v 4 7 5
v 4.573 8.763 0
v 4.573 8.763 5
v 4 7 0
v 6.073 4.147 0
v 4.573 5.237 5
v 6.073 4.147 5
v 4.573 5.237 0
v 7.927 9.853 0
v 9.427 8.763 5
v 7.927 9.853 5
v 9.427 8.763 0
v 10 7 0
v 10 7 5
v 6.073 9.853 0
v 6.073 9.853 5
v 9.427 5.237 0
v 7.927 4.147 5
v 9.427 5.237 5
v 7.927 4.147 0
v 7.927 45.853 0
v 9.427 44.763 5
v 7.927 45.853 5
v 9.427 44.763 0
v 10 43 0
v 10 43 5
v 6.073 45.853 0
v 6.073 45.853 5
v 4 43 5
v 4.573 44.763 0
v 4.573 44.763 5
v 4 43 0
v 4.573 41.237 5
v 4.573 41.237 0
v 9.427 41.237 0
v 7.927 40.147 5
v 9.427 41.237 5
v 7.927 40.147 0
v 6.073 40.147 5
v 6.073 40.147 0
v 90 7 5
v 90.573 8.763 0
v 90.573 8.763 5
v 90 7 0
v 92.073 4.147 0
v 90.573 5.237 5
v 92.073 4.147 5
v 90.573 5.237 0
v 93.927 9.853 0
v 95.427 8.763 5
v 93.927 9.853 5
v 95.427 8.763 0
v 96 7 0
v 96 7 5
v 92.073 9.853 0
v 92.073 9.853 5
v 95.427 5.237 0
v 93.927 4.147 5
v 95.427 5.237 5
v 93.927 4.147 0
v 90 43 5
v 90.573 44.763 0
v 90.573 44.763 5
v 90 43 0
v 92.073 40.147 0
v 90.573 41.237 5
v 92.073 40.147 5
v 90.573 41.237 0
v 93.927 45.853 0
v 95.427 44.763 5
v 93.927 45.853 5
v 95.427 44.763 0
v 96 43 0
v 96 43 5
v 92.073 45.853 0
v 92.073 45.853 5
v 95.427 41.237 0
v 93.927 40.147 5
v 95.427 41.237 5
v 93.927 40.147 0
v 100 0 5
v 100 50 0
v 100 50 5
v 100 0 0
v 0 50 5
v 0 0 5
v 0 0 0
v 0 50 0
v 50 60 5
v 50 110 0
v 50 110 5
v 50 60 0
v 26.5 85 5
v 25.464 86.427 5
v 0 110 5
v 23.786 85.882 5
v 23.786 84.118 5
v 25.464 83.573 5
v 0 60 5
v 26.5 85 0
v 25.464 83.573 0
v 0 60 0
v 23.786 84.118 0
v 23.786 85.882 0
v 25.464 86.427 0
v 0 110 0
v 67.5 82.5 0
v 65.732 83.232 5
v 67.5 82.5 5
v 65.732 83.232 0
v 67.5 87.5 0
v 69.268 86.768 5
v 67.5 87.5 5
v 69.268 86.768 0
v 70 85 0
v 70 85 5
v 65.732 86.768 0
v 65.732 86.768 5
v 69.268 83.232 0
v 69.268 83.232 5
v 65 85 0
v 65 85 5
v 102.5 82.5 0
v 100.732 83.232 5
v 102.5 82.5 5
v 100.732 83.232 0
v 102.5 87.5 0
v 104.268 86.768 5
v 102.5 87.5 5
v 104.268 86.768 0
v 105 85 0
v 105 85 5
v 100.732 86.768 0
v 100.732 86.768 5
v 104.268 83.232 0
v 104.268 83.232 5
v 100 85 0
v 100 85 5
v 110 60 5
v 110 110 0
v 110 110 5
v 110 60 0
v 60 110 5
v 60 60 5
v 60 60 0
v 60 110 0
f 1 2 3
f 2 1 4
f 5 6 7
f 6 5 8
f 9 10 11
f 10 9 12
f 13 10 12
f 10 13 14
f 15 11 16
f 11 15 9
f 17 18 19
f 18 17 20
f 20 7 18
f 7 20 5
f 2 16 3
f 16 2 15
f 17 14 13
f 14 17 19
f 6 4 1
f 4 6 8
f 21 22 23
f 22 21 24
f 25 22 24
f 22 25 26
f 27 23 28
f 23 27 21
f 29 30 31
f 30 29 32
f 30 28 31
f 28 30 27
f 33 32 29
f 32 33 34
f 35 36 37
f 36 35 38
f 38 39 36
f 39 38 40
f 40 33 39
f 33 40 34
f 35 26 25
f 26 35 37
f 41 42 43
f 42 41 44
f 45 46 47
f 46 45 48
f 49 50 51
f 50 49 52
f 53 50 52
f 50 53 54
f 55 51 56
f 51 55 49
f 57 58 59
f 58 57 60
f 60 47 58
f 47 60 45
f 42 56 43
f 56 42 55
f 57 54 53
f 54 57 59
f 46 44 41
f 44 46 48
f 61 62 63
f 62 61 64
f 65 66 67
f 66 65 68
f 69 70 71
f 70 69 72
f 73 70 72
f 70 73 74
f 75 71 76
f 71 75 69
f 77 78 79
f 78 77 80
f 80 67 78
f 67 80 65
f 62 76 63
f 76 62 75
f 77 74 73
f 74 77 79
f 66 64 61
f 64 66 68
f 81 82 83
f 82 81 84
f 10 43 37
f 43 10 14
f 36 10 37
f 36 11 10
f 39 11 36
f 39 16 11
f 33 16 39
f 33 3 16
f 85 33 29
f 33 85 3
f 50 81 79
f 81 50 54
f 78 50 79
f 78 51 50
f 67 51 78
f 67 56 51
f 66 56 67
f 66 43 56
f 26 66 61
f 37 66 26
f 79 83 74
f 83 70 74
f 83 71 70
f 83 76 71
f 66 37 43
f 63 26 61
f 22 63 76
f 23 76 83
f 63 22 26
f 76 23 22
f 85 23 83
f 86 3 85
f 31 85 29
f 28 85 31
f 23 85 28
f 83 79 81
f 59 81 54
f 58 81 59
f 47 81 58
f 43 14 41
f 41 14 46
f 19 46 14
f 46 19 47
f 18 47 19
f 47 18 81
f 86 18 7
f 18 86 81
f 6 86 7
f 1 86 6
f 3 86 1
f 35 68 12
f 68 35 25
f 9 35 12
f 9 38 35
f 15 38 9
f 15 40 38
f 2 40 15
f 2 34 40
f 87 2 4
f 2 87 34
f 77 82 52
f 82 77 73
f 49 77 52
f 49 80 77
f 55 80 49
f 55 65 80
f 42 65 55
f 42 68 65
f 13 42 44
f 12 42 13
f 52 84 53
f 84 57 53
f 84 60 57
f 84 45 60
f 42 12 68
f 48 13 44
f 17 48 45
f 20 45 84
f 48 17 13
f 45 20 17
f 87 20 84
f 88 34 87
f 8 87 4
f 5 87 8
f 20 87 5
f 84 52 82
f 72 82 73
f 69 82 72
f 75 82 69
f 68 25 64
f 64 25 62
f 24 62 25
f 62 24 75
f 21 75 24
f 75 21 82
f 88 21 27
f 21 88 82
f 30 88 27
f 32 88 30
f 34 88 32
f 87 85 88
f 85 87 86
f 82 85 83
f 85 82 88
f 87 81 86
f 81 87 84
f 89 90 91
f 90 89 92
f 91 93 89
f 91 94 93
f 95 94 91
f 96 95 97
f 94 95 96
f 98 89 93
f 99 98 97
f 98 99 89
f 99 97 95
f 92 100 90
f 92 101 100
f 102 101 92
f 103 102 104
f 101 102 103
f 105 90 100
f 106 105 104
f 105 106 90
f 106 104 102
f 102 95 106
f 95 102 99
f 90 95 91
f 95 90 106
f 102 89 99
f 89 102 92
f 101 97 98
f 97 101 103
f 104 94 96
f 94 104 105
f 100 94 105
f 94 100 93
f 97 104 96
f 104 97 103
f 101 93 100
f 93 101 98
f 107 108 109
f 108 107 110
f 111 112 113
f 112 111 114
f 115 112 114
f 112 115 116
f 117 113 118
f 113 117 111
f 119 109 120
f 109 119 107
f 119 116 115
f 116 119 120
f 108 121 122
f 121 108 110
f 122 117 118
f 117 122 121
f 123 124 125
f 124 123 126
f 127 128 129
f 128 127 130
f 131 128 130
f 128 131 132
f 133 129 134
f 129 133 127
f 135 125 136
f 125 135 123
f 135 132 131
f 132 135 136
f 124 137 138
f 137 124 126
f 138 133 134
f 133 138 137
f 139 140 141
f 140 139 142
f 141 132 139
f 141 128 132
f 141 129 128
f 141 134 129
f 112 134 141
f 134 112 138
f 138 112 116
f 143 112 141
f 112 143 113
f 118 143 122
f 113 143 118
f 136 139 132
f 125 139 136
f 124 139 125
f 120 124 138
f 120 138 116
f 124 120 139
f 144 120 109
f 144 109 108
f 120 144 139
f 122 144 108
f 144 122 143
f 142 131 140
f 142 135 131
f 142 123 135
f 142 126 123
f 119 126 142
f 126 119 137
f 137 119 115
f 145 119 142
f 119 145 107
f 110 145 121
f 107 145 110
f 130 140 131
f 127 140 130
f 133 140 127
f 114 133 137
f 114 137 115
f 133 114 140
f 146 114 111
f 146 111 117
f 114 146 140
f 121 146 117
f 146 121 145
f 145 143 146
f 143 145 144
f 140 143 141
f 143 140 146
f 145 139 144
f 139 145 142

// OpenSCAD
module hole_plate( size=[100,50,5], hole_dm=6, hole_margin=4, hole_count = [2,2]) {
    
    difference() {
        cube(size);
        
        abs_margin = hole_margin + hole_dm / 2;
        
        x_hole_dist = hole_count.x > 1 ?
                            (size.x - 2 * abs_margin) / (hole_count.x -1) : 0;
        
        y_hole_dist = hole_count.y > 1 ?
                            (size.y - 2 * abs_margin) / (hole_count.y -1) : 0;
        
//        echo(x_hole_dist, y_hole_dist);
        
        x_values = hole_count.x > 1 ?
                        [abs_margin : x_hole_dist : size.x - abs_margin + 0.1] : [size.x / 2];
        y_values = hole_count.y > 1 ?
                        [abs_margin : y_hole_dist : size.y - abs_margin + 0.1] : [size.y / 2];
        
        // 4 holes with for loop
        for (x = x_values, y = y_values)
            translate([x, y, -1])
            color( "red" )
                cylinder( h = size.z + 2, d = hole_dm);
    }
}

hole_plate([100,50,5], 6, 4);


translate( [0, 60, 0])
hole_plate( 
    size = [50,50,5], 
    hole_margin = 2, 
    hole_dm = 3,
    hole_count = [1,1]
);

translate( [60, 60, 0])
hole_plate( 
    size = [50,50,5], 
    hole_margin = 5, 
    hole_dm = 5,
    hole_count = [2,1]
);
